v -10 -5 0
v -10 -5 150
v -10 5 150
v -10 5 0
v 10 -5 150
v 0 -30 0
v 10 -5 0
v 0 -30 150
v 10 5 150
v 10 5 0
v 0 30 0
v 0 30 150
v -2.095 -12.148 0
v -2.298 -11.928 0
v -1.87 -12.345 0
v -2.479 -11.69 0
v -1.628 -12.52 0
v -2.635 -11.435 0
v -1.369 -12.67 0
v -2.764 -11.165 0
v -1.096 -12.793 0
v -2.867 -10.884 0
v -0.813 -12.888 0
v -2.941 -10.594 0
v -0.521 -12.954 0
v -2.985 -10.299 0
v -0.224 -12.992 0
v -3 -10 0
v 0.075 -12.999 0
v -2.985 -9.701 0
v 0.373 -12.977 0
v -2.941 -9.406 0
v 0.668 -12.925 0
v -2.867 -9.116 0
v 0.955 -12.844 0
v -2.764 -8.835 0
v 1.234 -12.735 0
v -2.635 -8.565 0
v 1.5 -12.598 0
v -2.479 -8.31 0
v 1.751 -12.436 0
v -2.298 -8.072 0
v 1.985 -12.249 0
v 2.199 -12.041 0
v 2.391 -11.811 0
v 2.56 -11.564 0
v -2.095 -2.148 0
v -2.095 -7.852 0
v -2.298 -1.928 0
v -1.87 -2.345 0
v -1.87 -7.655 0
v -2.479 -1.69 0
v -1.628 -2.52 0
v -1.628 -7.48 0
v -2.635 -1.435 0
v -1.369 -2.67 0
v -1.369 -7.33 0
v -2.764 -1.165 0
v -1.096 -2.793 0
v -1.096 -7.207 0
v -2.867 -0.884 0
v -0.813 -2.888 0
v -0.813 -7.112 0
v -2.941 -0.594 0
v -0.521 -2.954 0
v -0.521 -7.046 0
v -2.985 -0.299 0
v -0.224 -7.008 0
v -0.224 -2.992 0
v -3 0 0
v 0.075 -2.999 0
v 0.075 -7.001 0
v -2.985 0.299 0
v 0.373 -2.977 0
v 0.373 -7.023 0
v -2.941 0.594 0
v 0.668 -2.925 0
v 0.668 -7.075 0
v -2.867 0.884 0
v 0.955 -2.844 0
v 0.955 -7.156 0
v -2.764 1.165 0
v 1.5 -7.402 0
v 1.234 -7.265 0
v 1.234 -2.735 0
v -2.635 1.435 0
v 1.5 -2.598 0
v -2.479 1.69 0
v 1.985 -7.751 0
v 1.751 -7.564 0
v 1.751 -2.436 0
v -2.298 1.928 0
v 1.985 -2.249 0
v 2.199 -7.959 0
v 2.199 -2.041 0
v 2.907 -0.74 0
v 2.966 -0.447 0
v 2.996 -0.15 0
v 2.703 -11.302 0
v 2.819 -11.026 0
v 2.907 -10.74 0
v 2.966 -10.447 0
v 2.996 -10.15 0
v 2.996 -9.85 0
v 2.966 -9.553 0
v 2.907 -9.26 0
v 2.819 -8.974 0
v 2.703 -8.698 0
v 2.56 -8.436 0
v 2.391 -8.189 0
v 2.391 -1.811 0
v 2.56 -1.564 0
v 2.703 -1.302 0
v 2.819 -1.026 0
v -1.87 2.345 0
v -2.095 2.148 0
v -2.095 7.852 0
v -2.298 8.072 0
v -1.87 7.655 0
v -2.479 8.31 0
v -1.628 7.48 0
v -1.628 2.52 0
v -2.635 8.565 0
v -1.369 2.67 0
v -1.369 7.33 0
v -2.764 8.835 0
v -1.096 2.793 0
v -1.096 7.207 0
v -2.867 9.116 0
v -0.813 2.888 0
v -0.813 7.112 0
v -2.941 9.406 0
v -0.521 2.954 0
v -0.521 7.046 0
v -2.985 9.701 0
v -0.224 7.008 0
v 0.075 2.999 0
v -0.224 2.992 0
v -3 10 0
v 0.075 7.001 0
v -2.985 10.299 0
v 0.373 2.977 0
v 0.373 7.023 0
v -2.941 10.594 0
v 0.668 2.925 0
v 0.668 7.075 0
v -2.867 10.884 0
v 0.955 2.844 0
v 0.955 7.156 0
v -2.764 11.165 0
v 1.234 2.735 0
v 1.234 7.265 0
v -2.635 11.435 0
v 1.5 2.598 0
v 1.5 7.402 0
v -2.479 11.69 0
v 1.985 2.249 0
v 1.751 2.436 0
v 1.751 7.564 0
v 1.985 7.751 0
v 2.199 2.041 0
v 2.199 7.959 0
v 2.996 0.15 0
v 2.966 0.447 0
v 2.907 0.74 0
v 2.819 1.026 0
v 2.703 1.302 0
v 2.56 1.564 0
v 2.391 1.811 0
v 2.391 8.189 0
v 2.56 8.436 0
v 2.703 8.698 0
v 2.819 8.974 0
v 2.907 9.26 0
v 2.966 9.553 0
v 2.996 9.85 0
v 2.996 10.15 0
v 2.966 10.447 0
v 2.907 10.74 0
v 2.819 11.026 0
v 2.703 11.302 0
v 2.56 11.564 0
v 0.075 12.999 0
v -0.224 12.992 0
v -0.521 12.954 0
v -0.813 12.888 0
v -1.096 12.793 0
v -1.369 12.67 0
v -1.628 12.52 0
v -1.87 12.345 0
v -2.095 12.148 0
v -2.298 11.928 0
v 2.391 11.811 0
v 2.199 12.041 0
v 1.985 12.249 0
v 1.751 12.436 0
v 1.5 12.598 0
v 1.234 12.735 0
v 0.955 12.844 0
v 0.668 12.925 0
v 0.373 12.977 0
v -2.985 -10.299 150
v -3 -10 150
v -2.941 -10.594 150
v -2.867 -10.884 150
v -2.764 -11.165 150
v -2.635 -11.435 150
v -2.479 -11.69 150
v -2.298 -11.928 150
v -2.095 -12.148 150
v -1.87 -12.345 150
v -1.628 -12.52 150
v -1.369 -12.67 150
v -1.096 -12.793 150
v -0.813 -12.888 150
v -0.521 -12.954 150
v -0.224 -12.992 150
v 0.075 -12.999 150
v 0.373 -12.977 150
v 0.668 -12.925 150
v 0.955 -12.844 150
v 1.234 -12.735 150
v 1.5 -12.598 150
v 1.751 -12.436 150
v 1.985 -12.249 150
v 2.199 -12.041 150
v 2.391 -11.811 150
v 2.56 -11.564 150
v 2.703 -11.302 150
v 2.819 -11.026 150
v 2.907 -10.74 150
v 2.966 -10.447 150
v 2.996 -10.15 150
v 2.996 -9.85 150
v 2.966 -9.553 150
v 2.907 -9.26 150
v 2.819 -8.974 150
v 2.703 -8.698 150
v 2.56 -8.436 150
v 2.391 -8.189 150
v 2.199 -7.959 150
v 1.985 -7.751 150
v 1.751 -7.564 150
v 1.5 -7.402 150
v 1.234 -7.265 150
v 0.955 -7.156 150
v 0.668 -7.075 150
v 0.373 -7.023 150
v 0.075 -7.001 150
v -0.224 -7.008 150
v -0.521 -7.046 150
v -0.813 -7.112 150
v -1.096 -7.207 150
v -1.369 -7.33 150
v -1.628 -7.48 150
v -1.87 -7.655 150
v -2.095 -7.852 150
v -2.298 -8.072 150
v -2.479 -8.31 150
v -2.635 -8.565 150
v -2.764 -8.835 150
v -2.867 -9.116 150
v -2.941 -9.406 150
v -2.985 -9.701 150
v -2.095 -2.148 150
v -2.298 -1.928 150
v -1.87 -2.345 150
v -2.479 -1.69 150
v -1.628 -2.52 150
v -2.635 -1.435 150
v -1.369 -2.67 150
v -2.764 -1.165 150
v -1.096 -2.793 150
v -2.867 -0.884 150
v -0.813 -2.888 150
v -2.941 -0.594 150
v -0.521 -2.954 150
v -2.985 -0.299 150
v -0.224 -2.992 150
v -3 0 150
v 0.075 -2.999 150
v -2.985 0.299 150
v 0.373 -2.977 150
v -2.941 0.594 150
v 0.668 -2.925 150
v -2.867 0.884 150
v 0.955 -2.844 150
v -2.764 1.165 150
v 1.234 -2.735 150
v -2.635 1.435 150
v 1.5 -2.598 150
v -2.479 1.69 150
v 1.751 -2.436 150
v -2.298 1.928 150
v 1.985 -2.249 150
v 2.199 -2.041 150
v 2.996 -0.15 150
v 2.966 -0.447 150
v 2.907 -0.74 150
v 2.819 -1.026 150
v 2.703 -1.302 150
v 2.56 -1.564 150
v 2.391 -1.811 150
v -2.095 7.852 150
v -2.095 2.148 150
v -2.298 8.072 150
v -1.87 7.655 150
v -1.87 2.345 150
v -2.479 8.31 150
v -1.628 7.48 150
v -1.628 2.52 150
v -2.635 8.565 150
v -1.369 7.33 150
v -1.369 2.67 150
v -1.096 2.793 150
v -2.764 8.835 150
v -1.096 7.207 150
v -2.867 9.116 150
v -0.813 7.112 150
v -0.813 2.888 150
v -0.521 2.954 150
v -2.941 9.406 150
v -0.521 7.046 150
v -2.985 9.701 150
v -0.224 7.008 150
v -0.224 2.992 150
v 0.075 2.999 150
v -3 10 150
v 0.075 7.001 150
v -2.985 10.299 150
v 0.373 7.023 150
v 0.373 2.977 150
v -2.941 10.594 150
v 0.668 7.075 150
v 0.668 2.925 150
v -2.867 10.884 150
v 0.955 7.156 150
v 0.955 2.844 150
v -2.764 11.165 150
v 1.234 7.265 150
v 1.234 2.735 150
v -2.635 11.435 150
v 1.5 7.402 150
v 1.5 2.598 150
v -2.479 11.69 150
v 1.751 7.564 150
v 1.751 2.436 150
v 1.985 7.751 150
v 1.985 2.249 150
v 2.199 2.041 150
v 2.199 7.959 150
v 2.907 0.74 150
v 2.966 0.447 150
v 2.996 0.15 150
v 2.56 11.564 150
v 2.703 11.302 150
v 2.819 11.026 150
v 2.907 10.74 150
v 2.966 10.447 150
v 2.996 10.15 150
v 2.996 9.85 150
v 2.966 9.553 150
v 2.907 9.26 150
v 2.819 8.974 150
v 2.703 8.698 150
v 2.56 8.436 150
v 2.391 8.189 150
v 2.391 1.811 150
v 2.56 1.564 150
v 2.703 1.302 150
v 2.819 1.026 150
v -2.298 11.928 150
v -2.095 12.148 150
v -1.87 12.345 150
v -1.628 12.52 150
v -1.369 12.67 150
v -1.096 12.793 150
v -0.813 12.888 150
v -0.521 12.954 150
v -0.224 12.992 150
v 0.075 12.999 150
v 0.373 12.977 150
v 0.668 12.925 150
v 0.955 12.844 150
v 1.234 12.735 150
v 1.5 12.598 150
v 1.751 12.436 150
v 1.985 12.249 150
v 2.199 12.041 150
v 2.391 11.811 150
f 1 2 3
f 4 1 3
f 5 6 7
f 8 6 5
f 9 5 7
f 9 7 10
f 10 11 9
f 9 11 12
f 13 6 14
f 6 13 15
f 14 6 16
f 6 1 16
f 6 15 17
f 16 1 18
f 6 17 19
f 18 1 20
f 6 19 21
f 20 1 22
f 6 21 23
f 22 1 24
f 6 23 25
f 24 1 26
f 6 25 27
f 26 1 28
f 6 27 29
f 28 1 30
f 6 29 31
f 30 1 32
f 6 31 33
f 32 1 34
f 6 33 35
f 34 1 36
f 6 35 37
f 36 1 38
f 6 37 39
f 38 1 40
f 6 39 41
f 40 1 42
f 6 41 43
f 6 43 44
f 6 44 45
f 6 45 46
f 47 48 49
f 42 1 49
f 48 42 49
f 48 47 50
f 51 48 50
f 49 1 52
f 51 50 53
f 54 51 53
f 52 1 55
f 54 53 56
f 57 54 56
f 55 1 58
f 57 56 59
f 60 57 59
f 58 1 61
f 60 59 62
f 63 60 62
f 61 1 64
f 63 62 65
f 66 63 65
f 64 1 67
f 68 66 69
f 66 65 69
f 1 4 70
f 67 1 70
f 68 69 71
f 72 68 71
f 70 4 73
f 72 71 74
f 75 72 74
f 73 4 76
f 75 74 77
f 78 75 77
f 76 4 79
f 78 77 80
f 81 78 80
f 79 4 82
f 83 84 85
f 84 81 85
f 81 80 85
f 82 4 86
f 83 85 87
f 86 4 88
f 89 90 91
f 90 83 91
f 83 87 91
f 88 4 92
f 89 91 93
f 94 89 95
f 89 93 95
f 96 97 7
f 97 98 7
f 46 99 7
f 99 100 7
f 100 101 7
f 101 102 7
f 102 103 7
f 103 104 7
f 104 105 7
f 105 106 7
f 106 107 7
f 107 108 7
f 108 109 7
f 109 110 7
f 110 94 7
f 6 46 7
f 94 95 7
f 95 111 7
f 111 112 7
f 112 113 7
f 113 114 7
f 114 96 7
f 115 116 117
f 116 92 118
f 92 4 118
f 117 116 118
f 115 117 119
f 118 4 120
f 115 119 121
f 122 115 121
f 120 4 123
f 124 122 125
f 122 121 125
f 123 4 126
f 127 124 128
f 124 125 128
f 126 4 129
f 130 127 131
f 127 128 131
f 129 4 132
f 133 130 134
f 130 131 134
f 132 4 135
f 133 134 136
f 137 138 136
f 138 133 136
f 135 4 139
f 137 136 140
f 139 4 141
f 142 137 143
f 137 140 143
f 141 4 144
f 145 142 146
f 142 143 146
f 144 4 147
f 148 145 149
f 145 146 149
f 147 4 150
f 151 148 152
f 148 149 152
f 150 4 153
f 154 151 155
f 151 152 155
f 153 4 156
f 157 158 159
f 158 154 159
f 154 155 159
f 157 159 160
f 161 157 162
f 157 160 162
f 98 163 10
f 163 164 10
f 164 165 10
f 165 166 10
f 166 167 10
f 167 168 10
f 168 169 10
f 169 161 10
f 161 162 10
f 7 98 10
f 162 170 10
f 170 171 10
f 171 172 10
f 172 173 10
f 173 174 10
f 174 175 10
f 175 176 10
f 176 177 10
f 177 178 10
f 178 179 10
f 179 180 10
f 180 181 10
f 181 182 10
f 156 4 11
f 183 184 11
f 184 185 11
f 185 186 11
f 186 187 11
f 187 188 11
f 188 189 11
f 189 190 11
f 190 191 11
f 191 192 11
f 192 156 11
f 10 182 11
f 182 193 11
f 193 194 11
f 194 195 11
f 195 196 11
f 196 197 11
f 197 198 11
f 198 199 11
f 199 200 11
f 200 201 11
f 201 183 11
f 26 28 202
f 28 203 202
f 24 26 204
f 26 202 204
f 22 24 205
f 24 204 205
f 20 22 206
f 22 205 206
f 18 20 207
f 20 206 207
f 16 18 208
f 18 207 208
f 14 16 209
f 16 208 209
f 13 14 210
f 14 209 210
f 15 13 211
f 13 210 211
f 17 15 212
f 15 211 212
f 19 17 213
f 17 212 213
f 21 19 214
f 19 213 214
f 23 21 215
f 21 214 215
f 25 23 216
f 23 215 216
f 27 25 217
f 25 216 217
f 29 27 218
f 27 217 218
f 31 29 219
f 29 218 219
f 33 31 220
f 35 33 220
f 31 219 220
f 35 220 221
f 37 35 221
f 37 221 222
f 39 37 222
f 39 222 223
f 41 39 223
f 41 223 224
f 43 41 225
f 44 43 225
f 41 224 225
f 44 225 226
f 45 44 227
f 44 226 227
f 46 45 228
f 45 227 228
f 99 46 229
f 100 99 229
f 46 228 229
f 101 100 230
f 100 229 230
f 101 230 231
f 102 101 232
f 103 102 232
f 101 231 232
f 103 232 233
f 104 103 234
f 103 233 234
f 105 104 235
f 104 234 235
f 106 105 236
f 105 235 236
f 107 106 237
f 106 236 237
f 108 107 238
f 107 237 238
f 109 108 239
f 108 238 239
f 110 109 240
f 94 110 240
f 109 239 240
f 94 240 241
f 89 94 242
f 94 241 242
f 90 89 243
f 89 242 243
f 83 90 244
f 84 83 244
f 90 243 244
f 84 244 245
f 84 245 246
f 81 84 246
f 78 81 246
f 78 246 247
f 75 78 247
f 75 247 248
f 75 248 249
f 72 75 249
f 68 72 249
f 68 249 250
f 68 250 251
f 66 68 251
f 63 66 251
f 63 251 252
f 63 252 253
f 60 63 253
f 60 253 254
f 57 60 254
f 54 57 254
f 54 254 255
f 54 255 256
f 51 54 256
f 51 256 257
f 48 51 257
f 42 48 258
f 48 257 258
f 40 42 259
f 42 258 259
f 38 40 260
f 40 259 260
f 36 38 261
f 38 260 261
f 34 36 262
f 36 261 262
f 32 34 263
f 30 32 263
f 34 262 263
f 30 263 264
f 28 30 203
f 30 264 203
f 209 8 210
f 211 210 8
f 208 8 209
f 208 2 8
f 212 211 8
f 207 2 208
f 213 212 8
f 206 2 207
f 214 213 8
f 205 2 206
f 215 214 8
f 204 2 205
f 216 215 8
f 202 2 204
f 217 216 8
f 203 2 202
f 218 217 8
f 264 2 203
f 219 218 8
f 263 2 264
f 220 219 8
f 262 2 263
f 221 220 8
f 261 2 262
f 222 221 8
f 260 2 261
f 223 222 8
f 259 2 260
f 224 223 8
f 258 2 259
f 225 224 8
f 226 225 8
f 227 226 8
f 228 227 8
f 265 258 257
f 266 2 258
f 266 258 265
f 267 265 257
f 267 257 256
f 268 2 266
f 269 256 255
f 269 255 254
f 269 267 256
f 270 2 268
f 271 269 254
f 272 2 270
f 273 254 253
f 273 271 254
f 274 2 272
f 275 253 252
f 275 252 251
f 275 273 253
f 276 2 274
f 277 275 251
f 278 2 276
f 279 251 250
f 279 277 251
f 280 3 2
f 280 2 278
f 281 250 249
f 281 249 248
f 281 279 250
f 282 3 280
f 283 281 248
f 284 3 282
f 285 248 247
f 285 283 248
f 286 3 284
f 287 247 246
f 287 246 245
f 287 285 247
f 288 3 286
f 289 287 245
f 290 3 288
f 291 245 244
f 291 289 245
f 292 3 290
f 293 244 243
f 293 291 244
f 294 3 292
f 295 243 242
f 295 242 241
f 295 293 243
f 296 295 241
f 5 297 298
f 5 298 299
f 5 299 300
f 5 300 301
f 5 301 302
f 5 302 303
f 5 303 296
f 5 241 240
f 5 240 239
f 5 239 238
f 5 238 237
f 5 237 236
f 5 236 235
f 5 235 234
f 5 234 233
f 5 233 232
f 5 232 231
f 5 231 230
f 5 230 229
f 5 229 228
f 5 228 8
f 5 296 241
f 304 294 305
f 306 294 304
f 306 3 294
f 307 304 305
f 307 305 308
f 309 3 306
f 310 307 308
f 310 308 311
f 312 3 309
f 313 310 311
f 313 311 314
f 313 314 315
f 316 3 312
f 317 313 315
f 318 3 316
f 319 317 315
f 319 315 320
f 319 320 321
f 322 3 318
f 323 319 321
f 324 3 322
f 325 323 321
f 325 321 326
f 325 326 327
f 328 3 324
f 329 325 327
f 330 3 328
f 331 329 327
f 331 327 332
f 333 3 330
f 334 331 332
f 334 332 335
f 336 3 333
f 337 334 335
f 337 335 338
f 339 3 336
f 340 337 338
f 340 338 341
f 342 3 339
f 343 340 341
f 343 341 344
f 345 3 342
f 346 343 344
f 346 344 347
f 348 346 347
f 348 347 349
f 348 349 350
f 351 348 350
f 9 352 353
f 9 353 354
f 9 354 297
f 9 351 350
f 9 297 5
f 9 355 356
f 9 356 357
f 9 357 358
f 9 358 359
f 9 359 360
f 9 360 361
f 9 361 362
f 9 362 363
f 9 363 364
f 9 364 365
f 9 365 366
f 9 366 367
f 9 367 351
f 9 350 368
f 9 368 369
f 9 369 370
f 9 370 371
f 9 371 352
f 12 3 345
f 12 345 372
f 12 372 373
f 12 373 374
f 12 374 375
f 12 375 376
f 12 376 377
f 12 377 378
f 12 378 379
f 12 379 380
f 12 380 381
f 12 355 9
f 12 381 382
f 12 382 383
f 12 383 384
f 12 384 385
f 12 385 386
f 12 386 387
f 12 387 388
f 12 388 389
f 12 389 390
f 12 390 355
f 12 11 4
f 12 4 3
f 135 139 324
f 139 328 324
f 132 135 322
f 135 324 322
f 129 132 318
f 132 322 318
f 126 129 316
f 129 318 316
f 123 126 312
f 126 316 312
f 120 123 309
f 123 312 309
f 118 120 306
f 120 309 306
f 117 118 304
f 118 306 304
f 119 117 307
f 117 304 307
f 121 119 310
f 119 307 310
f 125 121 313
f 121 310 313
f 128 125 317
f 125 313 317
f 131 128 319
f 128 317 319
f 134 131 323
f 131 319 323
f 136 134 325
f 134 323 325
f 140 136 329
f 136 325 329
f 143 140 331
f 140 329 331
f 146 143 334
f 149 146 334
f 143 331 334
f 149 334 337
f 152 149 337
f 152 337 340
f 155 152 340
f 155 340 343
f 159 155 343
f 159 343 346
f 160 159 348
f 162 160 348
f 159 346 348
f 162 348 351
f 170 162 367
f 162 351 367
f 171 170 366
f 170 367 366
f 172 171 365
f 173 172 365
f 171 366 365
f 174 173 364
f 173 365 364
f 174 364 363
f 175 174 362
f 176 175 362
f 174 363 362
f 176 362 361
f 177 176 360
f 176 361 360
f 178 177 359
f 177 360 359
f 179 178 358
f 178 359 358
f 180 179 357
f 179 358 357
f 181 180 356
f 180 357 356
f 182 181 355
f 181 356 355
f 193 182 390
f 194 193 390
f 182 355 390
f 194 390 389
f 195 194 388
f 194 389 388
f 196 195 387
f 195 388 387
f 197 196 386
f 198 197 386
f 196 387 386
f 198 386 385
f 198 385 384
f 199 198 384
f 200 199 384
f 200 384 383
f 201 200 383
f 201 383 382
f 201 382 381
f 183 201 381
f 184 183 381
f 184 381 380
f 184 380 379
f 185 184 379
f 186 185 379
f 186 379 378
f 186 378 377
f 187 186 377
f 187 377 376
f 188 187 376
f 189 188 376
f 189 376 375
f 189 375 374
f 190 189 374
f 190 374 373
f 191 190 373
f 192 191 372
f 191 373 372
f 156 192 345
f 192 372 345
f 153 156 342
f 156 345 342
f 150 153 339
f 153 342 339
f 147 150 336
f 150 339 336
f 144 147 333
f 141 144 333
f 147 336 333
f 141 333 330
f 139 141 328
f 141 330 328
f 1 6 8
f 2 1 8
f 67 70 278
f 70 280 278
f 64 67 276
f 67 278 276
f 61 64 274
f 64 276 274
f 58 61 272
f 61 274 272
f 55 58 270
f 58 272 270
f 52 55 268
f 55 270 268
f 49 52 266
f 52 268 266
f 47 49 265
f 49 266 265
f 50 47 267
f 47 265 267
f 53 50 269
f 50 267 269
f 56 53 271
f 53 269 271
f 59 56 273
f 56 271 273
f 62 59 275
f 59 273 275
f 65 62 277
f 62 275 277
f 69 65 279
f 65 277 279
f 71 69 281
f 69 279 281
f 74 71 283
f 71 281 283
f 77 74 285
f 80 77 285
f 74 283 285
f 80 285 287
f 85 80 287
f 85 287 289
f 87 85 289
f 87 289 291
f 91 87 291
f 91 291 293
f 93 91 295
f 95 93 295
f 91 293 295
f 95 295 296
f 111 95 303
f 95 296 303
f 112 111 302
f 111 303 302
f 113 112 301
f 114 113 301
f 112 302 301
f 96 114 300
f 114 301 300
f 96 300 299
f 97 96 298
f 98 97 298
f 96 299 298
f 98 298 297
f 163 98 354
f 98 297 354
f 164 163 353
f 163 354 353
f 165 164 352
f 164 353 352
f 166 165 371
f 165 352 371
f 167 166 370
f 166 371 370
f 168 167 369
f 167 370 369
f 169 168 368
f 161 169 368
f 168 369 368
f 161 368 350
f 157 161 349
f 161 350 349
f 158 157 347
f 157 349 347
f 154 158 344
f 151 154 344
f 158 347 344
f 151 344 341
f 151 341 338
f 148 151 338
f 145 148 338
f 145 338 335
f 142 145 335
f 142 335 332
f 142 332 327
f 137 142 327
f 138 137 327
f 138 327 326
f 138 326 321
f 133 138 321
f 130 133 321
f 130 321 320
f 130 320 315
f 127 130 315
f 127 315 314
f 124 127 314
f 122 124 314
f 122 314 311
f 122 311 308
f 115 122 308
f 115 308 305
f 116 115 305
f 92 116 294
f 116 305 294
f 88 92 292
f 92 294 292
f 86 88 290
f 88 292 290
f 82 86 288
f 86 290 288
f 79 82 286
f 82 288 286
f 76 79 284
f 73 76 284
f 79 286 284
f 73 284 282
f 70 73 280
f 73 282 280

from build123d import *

# Parameters (mm, degrees)
F0_W       = 20
F0_H       = 60
F1_DEPTH   = 150
F2_D       = 6
F2_DEPTH   = 150
F2_TIP     = 1.8025818571
F3_SIZE2   = 10
F3_SIZE    = 25
F3_2_SIZE2 = 9.99999
F3_2_SIZE  = 24.99999


# Not quite as in the source:
# - a fillet or chamfer is up to 0.001 mm smaller than in the source, because OpenCascade refuses the exact size


with BuildPart() as f1:
    # F0 (on Top) → F1 (new body)
    with BuildSketch(Plane.XY):
        Rectangle(F0_W, F0_H)
    extrude(amount=F1_DEPTH)

    # F2
    with Locations(Plane(origin=(0, 0, 0), x_dir=(1, 0, 0), z_dir=(0, 0, -1))):
        with Locations((0, -10), (0, 0), (0, 10)):
            Hole(F2_D / 2, depth=F2_DEPTH)
            with Locations((0, 0, -(F2_DEPTH + F2_TIP / 2))):  # 118° drill point
                Cone(0, F2_D / 2, F2_TIP, mode=Mode.SUBTRACT)

    # F3
    f3_edges = [f1.edges().sort_by_distance(p)[0] for p in [
        (-10, 30, 75),
        (-10, -30, 75),
    ]]
    f3_side = f1.faces().sort_by_distance((-10, 0, 75))[0]
    chamfer(f3_edges, length=F3_SIZE, length2=F3_SIZE2, reference=f3_side)

    # F3#2 (size 25 and 10 in the source; OpenCascade refuses exactly that, so slightly less here)
    f3_2_edges = [f1.edges().sort_by_distance(p)[0] for p in [
        (10, -30, 75),
        (10, 30, 75),
    ]]
    f3_2_side = f1.faces().sort_by_distance((10, 0, 75))[0]
    chamfer(f3_2_edges, length=F3_2_SIZE, length2=F3_2_SIZE2, reference=f3_2_side)


solid = f1.part
